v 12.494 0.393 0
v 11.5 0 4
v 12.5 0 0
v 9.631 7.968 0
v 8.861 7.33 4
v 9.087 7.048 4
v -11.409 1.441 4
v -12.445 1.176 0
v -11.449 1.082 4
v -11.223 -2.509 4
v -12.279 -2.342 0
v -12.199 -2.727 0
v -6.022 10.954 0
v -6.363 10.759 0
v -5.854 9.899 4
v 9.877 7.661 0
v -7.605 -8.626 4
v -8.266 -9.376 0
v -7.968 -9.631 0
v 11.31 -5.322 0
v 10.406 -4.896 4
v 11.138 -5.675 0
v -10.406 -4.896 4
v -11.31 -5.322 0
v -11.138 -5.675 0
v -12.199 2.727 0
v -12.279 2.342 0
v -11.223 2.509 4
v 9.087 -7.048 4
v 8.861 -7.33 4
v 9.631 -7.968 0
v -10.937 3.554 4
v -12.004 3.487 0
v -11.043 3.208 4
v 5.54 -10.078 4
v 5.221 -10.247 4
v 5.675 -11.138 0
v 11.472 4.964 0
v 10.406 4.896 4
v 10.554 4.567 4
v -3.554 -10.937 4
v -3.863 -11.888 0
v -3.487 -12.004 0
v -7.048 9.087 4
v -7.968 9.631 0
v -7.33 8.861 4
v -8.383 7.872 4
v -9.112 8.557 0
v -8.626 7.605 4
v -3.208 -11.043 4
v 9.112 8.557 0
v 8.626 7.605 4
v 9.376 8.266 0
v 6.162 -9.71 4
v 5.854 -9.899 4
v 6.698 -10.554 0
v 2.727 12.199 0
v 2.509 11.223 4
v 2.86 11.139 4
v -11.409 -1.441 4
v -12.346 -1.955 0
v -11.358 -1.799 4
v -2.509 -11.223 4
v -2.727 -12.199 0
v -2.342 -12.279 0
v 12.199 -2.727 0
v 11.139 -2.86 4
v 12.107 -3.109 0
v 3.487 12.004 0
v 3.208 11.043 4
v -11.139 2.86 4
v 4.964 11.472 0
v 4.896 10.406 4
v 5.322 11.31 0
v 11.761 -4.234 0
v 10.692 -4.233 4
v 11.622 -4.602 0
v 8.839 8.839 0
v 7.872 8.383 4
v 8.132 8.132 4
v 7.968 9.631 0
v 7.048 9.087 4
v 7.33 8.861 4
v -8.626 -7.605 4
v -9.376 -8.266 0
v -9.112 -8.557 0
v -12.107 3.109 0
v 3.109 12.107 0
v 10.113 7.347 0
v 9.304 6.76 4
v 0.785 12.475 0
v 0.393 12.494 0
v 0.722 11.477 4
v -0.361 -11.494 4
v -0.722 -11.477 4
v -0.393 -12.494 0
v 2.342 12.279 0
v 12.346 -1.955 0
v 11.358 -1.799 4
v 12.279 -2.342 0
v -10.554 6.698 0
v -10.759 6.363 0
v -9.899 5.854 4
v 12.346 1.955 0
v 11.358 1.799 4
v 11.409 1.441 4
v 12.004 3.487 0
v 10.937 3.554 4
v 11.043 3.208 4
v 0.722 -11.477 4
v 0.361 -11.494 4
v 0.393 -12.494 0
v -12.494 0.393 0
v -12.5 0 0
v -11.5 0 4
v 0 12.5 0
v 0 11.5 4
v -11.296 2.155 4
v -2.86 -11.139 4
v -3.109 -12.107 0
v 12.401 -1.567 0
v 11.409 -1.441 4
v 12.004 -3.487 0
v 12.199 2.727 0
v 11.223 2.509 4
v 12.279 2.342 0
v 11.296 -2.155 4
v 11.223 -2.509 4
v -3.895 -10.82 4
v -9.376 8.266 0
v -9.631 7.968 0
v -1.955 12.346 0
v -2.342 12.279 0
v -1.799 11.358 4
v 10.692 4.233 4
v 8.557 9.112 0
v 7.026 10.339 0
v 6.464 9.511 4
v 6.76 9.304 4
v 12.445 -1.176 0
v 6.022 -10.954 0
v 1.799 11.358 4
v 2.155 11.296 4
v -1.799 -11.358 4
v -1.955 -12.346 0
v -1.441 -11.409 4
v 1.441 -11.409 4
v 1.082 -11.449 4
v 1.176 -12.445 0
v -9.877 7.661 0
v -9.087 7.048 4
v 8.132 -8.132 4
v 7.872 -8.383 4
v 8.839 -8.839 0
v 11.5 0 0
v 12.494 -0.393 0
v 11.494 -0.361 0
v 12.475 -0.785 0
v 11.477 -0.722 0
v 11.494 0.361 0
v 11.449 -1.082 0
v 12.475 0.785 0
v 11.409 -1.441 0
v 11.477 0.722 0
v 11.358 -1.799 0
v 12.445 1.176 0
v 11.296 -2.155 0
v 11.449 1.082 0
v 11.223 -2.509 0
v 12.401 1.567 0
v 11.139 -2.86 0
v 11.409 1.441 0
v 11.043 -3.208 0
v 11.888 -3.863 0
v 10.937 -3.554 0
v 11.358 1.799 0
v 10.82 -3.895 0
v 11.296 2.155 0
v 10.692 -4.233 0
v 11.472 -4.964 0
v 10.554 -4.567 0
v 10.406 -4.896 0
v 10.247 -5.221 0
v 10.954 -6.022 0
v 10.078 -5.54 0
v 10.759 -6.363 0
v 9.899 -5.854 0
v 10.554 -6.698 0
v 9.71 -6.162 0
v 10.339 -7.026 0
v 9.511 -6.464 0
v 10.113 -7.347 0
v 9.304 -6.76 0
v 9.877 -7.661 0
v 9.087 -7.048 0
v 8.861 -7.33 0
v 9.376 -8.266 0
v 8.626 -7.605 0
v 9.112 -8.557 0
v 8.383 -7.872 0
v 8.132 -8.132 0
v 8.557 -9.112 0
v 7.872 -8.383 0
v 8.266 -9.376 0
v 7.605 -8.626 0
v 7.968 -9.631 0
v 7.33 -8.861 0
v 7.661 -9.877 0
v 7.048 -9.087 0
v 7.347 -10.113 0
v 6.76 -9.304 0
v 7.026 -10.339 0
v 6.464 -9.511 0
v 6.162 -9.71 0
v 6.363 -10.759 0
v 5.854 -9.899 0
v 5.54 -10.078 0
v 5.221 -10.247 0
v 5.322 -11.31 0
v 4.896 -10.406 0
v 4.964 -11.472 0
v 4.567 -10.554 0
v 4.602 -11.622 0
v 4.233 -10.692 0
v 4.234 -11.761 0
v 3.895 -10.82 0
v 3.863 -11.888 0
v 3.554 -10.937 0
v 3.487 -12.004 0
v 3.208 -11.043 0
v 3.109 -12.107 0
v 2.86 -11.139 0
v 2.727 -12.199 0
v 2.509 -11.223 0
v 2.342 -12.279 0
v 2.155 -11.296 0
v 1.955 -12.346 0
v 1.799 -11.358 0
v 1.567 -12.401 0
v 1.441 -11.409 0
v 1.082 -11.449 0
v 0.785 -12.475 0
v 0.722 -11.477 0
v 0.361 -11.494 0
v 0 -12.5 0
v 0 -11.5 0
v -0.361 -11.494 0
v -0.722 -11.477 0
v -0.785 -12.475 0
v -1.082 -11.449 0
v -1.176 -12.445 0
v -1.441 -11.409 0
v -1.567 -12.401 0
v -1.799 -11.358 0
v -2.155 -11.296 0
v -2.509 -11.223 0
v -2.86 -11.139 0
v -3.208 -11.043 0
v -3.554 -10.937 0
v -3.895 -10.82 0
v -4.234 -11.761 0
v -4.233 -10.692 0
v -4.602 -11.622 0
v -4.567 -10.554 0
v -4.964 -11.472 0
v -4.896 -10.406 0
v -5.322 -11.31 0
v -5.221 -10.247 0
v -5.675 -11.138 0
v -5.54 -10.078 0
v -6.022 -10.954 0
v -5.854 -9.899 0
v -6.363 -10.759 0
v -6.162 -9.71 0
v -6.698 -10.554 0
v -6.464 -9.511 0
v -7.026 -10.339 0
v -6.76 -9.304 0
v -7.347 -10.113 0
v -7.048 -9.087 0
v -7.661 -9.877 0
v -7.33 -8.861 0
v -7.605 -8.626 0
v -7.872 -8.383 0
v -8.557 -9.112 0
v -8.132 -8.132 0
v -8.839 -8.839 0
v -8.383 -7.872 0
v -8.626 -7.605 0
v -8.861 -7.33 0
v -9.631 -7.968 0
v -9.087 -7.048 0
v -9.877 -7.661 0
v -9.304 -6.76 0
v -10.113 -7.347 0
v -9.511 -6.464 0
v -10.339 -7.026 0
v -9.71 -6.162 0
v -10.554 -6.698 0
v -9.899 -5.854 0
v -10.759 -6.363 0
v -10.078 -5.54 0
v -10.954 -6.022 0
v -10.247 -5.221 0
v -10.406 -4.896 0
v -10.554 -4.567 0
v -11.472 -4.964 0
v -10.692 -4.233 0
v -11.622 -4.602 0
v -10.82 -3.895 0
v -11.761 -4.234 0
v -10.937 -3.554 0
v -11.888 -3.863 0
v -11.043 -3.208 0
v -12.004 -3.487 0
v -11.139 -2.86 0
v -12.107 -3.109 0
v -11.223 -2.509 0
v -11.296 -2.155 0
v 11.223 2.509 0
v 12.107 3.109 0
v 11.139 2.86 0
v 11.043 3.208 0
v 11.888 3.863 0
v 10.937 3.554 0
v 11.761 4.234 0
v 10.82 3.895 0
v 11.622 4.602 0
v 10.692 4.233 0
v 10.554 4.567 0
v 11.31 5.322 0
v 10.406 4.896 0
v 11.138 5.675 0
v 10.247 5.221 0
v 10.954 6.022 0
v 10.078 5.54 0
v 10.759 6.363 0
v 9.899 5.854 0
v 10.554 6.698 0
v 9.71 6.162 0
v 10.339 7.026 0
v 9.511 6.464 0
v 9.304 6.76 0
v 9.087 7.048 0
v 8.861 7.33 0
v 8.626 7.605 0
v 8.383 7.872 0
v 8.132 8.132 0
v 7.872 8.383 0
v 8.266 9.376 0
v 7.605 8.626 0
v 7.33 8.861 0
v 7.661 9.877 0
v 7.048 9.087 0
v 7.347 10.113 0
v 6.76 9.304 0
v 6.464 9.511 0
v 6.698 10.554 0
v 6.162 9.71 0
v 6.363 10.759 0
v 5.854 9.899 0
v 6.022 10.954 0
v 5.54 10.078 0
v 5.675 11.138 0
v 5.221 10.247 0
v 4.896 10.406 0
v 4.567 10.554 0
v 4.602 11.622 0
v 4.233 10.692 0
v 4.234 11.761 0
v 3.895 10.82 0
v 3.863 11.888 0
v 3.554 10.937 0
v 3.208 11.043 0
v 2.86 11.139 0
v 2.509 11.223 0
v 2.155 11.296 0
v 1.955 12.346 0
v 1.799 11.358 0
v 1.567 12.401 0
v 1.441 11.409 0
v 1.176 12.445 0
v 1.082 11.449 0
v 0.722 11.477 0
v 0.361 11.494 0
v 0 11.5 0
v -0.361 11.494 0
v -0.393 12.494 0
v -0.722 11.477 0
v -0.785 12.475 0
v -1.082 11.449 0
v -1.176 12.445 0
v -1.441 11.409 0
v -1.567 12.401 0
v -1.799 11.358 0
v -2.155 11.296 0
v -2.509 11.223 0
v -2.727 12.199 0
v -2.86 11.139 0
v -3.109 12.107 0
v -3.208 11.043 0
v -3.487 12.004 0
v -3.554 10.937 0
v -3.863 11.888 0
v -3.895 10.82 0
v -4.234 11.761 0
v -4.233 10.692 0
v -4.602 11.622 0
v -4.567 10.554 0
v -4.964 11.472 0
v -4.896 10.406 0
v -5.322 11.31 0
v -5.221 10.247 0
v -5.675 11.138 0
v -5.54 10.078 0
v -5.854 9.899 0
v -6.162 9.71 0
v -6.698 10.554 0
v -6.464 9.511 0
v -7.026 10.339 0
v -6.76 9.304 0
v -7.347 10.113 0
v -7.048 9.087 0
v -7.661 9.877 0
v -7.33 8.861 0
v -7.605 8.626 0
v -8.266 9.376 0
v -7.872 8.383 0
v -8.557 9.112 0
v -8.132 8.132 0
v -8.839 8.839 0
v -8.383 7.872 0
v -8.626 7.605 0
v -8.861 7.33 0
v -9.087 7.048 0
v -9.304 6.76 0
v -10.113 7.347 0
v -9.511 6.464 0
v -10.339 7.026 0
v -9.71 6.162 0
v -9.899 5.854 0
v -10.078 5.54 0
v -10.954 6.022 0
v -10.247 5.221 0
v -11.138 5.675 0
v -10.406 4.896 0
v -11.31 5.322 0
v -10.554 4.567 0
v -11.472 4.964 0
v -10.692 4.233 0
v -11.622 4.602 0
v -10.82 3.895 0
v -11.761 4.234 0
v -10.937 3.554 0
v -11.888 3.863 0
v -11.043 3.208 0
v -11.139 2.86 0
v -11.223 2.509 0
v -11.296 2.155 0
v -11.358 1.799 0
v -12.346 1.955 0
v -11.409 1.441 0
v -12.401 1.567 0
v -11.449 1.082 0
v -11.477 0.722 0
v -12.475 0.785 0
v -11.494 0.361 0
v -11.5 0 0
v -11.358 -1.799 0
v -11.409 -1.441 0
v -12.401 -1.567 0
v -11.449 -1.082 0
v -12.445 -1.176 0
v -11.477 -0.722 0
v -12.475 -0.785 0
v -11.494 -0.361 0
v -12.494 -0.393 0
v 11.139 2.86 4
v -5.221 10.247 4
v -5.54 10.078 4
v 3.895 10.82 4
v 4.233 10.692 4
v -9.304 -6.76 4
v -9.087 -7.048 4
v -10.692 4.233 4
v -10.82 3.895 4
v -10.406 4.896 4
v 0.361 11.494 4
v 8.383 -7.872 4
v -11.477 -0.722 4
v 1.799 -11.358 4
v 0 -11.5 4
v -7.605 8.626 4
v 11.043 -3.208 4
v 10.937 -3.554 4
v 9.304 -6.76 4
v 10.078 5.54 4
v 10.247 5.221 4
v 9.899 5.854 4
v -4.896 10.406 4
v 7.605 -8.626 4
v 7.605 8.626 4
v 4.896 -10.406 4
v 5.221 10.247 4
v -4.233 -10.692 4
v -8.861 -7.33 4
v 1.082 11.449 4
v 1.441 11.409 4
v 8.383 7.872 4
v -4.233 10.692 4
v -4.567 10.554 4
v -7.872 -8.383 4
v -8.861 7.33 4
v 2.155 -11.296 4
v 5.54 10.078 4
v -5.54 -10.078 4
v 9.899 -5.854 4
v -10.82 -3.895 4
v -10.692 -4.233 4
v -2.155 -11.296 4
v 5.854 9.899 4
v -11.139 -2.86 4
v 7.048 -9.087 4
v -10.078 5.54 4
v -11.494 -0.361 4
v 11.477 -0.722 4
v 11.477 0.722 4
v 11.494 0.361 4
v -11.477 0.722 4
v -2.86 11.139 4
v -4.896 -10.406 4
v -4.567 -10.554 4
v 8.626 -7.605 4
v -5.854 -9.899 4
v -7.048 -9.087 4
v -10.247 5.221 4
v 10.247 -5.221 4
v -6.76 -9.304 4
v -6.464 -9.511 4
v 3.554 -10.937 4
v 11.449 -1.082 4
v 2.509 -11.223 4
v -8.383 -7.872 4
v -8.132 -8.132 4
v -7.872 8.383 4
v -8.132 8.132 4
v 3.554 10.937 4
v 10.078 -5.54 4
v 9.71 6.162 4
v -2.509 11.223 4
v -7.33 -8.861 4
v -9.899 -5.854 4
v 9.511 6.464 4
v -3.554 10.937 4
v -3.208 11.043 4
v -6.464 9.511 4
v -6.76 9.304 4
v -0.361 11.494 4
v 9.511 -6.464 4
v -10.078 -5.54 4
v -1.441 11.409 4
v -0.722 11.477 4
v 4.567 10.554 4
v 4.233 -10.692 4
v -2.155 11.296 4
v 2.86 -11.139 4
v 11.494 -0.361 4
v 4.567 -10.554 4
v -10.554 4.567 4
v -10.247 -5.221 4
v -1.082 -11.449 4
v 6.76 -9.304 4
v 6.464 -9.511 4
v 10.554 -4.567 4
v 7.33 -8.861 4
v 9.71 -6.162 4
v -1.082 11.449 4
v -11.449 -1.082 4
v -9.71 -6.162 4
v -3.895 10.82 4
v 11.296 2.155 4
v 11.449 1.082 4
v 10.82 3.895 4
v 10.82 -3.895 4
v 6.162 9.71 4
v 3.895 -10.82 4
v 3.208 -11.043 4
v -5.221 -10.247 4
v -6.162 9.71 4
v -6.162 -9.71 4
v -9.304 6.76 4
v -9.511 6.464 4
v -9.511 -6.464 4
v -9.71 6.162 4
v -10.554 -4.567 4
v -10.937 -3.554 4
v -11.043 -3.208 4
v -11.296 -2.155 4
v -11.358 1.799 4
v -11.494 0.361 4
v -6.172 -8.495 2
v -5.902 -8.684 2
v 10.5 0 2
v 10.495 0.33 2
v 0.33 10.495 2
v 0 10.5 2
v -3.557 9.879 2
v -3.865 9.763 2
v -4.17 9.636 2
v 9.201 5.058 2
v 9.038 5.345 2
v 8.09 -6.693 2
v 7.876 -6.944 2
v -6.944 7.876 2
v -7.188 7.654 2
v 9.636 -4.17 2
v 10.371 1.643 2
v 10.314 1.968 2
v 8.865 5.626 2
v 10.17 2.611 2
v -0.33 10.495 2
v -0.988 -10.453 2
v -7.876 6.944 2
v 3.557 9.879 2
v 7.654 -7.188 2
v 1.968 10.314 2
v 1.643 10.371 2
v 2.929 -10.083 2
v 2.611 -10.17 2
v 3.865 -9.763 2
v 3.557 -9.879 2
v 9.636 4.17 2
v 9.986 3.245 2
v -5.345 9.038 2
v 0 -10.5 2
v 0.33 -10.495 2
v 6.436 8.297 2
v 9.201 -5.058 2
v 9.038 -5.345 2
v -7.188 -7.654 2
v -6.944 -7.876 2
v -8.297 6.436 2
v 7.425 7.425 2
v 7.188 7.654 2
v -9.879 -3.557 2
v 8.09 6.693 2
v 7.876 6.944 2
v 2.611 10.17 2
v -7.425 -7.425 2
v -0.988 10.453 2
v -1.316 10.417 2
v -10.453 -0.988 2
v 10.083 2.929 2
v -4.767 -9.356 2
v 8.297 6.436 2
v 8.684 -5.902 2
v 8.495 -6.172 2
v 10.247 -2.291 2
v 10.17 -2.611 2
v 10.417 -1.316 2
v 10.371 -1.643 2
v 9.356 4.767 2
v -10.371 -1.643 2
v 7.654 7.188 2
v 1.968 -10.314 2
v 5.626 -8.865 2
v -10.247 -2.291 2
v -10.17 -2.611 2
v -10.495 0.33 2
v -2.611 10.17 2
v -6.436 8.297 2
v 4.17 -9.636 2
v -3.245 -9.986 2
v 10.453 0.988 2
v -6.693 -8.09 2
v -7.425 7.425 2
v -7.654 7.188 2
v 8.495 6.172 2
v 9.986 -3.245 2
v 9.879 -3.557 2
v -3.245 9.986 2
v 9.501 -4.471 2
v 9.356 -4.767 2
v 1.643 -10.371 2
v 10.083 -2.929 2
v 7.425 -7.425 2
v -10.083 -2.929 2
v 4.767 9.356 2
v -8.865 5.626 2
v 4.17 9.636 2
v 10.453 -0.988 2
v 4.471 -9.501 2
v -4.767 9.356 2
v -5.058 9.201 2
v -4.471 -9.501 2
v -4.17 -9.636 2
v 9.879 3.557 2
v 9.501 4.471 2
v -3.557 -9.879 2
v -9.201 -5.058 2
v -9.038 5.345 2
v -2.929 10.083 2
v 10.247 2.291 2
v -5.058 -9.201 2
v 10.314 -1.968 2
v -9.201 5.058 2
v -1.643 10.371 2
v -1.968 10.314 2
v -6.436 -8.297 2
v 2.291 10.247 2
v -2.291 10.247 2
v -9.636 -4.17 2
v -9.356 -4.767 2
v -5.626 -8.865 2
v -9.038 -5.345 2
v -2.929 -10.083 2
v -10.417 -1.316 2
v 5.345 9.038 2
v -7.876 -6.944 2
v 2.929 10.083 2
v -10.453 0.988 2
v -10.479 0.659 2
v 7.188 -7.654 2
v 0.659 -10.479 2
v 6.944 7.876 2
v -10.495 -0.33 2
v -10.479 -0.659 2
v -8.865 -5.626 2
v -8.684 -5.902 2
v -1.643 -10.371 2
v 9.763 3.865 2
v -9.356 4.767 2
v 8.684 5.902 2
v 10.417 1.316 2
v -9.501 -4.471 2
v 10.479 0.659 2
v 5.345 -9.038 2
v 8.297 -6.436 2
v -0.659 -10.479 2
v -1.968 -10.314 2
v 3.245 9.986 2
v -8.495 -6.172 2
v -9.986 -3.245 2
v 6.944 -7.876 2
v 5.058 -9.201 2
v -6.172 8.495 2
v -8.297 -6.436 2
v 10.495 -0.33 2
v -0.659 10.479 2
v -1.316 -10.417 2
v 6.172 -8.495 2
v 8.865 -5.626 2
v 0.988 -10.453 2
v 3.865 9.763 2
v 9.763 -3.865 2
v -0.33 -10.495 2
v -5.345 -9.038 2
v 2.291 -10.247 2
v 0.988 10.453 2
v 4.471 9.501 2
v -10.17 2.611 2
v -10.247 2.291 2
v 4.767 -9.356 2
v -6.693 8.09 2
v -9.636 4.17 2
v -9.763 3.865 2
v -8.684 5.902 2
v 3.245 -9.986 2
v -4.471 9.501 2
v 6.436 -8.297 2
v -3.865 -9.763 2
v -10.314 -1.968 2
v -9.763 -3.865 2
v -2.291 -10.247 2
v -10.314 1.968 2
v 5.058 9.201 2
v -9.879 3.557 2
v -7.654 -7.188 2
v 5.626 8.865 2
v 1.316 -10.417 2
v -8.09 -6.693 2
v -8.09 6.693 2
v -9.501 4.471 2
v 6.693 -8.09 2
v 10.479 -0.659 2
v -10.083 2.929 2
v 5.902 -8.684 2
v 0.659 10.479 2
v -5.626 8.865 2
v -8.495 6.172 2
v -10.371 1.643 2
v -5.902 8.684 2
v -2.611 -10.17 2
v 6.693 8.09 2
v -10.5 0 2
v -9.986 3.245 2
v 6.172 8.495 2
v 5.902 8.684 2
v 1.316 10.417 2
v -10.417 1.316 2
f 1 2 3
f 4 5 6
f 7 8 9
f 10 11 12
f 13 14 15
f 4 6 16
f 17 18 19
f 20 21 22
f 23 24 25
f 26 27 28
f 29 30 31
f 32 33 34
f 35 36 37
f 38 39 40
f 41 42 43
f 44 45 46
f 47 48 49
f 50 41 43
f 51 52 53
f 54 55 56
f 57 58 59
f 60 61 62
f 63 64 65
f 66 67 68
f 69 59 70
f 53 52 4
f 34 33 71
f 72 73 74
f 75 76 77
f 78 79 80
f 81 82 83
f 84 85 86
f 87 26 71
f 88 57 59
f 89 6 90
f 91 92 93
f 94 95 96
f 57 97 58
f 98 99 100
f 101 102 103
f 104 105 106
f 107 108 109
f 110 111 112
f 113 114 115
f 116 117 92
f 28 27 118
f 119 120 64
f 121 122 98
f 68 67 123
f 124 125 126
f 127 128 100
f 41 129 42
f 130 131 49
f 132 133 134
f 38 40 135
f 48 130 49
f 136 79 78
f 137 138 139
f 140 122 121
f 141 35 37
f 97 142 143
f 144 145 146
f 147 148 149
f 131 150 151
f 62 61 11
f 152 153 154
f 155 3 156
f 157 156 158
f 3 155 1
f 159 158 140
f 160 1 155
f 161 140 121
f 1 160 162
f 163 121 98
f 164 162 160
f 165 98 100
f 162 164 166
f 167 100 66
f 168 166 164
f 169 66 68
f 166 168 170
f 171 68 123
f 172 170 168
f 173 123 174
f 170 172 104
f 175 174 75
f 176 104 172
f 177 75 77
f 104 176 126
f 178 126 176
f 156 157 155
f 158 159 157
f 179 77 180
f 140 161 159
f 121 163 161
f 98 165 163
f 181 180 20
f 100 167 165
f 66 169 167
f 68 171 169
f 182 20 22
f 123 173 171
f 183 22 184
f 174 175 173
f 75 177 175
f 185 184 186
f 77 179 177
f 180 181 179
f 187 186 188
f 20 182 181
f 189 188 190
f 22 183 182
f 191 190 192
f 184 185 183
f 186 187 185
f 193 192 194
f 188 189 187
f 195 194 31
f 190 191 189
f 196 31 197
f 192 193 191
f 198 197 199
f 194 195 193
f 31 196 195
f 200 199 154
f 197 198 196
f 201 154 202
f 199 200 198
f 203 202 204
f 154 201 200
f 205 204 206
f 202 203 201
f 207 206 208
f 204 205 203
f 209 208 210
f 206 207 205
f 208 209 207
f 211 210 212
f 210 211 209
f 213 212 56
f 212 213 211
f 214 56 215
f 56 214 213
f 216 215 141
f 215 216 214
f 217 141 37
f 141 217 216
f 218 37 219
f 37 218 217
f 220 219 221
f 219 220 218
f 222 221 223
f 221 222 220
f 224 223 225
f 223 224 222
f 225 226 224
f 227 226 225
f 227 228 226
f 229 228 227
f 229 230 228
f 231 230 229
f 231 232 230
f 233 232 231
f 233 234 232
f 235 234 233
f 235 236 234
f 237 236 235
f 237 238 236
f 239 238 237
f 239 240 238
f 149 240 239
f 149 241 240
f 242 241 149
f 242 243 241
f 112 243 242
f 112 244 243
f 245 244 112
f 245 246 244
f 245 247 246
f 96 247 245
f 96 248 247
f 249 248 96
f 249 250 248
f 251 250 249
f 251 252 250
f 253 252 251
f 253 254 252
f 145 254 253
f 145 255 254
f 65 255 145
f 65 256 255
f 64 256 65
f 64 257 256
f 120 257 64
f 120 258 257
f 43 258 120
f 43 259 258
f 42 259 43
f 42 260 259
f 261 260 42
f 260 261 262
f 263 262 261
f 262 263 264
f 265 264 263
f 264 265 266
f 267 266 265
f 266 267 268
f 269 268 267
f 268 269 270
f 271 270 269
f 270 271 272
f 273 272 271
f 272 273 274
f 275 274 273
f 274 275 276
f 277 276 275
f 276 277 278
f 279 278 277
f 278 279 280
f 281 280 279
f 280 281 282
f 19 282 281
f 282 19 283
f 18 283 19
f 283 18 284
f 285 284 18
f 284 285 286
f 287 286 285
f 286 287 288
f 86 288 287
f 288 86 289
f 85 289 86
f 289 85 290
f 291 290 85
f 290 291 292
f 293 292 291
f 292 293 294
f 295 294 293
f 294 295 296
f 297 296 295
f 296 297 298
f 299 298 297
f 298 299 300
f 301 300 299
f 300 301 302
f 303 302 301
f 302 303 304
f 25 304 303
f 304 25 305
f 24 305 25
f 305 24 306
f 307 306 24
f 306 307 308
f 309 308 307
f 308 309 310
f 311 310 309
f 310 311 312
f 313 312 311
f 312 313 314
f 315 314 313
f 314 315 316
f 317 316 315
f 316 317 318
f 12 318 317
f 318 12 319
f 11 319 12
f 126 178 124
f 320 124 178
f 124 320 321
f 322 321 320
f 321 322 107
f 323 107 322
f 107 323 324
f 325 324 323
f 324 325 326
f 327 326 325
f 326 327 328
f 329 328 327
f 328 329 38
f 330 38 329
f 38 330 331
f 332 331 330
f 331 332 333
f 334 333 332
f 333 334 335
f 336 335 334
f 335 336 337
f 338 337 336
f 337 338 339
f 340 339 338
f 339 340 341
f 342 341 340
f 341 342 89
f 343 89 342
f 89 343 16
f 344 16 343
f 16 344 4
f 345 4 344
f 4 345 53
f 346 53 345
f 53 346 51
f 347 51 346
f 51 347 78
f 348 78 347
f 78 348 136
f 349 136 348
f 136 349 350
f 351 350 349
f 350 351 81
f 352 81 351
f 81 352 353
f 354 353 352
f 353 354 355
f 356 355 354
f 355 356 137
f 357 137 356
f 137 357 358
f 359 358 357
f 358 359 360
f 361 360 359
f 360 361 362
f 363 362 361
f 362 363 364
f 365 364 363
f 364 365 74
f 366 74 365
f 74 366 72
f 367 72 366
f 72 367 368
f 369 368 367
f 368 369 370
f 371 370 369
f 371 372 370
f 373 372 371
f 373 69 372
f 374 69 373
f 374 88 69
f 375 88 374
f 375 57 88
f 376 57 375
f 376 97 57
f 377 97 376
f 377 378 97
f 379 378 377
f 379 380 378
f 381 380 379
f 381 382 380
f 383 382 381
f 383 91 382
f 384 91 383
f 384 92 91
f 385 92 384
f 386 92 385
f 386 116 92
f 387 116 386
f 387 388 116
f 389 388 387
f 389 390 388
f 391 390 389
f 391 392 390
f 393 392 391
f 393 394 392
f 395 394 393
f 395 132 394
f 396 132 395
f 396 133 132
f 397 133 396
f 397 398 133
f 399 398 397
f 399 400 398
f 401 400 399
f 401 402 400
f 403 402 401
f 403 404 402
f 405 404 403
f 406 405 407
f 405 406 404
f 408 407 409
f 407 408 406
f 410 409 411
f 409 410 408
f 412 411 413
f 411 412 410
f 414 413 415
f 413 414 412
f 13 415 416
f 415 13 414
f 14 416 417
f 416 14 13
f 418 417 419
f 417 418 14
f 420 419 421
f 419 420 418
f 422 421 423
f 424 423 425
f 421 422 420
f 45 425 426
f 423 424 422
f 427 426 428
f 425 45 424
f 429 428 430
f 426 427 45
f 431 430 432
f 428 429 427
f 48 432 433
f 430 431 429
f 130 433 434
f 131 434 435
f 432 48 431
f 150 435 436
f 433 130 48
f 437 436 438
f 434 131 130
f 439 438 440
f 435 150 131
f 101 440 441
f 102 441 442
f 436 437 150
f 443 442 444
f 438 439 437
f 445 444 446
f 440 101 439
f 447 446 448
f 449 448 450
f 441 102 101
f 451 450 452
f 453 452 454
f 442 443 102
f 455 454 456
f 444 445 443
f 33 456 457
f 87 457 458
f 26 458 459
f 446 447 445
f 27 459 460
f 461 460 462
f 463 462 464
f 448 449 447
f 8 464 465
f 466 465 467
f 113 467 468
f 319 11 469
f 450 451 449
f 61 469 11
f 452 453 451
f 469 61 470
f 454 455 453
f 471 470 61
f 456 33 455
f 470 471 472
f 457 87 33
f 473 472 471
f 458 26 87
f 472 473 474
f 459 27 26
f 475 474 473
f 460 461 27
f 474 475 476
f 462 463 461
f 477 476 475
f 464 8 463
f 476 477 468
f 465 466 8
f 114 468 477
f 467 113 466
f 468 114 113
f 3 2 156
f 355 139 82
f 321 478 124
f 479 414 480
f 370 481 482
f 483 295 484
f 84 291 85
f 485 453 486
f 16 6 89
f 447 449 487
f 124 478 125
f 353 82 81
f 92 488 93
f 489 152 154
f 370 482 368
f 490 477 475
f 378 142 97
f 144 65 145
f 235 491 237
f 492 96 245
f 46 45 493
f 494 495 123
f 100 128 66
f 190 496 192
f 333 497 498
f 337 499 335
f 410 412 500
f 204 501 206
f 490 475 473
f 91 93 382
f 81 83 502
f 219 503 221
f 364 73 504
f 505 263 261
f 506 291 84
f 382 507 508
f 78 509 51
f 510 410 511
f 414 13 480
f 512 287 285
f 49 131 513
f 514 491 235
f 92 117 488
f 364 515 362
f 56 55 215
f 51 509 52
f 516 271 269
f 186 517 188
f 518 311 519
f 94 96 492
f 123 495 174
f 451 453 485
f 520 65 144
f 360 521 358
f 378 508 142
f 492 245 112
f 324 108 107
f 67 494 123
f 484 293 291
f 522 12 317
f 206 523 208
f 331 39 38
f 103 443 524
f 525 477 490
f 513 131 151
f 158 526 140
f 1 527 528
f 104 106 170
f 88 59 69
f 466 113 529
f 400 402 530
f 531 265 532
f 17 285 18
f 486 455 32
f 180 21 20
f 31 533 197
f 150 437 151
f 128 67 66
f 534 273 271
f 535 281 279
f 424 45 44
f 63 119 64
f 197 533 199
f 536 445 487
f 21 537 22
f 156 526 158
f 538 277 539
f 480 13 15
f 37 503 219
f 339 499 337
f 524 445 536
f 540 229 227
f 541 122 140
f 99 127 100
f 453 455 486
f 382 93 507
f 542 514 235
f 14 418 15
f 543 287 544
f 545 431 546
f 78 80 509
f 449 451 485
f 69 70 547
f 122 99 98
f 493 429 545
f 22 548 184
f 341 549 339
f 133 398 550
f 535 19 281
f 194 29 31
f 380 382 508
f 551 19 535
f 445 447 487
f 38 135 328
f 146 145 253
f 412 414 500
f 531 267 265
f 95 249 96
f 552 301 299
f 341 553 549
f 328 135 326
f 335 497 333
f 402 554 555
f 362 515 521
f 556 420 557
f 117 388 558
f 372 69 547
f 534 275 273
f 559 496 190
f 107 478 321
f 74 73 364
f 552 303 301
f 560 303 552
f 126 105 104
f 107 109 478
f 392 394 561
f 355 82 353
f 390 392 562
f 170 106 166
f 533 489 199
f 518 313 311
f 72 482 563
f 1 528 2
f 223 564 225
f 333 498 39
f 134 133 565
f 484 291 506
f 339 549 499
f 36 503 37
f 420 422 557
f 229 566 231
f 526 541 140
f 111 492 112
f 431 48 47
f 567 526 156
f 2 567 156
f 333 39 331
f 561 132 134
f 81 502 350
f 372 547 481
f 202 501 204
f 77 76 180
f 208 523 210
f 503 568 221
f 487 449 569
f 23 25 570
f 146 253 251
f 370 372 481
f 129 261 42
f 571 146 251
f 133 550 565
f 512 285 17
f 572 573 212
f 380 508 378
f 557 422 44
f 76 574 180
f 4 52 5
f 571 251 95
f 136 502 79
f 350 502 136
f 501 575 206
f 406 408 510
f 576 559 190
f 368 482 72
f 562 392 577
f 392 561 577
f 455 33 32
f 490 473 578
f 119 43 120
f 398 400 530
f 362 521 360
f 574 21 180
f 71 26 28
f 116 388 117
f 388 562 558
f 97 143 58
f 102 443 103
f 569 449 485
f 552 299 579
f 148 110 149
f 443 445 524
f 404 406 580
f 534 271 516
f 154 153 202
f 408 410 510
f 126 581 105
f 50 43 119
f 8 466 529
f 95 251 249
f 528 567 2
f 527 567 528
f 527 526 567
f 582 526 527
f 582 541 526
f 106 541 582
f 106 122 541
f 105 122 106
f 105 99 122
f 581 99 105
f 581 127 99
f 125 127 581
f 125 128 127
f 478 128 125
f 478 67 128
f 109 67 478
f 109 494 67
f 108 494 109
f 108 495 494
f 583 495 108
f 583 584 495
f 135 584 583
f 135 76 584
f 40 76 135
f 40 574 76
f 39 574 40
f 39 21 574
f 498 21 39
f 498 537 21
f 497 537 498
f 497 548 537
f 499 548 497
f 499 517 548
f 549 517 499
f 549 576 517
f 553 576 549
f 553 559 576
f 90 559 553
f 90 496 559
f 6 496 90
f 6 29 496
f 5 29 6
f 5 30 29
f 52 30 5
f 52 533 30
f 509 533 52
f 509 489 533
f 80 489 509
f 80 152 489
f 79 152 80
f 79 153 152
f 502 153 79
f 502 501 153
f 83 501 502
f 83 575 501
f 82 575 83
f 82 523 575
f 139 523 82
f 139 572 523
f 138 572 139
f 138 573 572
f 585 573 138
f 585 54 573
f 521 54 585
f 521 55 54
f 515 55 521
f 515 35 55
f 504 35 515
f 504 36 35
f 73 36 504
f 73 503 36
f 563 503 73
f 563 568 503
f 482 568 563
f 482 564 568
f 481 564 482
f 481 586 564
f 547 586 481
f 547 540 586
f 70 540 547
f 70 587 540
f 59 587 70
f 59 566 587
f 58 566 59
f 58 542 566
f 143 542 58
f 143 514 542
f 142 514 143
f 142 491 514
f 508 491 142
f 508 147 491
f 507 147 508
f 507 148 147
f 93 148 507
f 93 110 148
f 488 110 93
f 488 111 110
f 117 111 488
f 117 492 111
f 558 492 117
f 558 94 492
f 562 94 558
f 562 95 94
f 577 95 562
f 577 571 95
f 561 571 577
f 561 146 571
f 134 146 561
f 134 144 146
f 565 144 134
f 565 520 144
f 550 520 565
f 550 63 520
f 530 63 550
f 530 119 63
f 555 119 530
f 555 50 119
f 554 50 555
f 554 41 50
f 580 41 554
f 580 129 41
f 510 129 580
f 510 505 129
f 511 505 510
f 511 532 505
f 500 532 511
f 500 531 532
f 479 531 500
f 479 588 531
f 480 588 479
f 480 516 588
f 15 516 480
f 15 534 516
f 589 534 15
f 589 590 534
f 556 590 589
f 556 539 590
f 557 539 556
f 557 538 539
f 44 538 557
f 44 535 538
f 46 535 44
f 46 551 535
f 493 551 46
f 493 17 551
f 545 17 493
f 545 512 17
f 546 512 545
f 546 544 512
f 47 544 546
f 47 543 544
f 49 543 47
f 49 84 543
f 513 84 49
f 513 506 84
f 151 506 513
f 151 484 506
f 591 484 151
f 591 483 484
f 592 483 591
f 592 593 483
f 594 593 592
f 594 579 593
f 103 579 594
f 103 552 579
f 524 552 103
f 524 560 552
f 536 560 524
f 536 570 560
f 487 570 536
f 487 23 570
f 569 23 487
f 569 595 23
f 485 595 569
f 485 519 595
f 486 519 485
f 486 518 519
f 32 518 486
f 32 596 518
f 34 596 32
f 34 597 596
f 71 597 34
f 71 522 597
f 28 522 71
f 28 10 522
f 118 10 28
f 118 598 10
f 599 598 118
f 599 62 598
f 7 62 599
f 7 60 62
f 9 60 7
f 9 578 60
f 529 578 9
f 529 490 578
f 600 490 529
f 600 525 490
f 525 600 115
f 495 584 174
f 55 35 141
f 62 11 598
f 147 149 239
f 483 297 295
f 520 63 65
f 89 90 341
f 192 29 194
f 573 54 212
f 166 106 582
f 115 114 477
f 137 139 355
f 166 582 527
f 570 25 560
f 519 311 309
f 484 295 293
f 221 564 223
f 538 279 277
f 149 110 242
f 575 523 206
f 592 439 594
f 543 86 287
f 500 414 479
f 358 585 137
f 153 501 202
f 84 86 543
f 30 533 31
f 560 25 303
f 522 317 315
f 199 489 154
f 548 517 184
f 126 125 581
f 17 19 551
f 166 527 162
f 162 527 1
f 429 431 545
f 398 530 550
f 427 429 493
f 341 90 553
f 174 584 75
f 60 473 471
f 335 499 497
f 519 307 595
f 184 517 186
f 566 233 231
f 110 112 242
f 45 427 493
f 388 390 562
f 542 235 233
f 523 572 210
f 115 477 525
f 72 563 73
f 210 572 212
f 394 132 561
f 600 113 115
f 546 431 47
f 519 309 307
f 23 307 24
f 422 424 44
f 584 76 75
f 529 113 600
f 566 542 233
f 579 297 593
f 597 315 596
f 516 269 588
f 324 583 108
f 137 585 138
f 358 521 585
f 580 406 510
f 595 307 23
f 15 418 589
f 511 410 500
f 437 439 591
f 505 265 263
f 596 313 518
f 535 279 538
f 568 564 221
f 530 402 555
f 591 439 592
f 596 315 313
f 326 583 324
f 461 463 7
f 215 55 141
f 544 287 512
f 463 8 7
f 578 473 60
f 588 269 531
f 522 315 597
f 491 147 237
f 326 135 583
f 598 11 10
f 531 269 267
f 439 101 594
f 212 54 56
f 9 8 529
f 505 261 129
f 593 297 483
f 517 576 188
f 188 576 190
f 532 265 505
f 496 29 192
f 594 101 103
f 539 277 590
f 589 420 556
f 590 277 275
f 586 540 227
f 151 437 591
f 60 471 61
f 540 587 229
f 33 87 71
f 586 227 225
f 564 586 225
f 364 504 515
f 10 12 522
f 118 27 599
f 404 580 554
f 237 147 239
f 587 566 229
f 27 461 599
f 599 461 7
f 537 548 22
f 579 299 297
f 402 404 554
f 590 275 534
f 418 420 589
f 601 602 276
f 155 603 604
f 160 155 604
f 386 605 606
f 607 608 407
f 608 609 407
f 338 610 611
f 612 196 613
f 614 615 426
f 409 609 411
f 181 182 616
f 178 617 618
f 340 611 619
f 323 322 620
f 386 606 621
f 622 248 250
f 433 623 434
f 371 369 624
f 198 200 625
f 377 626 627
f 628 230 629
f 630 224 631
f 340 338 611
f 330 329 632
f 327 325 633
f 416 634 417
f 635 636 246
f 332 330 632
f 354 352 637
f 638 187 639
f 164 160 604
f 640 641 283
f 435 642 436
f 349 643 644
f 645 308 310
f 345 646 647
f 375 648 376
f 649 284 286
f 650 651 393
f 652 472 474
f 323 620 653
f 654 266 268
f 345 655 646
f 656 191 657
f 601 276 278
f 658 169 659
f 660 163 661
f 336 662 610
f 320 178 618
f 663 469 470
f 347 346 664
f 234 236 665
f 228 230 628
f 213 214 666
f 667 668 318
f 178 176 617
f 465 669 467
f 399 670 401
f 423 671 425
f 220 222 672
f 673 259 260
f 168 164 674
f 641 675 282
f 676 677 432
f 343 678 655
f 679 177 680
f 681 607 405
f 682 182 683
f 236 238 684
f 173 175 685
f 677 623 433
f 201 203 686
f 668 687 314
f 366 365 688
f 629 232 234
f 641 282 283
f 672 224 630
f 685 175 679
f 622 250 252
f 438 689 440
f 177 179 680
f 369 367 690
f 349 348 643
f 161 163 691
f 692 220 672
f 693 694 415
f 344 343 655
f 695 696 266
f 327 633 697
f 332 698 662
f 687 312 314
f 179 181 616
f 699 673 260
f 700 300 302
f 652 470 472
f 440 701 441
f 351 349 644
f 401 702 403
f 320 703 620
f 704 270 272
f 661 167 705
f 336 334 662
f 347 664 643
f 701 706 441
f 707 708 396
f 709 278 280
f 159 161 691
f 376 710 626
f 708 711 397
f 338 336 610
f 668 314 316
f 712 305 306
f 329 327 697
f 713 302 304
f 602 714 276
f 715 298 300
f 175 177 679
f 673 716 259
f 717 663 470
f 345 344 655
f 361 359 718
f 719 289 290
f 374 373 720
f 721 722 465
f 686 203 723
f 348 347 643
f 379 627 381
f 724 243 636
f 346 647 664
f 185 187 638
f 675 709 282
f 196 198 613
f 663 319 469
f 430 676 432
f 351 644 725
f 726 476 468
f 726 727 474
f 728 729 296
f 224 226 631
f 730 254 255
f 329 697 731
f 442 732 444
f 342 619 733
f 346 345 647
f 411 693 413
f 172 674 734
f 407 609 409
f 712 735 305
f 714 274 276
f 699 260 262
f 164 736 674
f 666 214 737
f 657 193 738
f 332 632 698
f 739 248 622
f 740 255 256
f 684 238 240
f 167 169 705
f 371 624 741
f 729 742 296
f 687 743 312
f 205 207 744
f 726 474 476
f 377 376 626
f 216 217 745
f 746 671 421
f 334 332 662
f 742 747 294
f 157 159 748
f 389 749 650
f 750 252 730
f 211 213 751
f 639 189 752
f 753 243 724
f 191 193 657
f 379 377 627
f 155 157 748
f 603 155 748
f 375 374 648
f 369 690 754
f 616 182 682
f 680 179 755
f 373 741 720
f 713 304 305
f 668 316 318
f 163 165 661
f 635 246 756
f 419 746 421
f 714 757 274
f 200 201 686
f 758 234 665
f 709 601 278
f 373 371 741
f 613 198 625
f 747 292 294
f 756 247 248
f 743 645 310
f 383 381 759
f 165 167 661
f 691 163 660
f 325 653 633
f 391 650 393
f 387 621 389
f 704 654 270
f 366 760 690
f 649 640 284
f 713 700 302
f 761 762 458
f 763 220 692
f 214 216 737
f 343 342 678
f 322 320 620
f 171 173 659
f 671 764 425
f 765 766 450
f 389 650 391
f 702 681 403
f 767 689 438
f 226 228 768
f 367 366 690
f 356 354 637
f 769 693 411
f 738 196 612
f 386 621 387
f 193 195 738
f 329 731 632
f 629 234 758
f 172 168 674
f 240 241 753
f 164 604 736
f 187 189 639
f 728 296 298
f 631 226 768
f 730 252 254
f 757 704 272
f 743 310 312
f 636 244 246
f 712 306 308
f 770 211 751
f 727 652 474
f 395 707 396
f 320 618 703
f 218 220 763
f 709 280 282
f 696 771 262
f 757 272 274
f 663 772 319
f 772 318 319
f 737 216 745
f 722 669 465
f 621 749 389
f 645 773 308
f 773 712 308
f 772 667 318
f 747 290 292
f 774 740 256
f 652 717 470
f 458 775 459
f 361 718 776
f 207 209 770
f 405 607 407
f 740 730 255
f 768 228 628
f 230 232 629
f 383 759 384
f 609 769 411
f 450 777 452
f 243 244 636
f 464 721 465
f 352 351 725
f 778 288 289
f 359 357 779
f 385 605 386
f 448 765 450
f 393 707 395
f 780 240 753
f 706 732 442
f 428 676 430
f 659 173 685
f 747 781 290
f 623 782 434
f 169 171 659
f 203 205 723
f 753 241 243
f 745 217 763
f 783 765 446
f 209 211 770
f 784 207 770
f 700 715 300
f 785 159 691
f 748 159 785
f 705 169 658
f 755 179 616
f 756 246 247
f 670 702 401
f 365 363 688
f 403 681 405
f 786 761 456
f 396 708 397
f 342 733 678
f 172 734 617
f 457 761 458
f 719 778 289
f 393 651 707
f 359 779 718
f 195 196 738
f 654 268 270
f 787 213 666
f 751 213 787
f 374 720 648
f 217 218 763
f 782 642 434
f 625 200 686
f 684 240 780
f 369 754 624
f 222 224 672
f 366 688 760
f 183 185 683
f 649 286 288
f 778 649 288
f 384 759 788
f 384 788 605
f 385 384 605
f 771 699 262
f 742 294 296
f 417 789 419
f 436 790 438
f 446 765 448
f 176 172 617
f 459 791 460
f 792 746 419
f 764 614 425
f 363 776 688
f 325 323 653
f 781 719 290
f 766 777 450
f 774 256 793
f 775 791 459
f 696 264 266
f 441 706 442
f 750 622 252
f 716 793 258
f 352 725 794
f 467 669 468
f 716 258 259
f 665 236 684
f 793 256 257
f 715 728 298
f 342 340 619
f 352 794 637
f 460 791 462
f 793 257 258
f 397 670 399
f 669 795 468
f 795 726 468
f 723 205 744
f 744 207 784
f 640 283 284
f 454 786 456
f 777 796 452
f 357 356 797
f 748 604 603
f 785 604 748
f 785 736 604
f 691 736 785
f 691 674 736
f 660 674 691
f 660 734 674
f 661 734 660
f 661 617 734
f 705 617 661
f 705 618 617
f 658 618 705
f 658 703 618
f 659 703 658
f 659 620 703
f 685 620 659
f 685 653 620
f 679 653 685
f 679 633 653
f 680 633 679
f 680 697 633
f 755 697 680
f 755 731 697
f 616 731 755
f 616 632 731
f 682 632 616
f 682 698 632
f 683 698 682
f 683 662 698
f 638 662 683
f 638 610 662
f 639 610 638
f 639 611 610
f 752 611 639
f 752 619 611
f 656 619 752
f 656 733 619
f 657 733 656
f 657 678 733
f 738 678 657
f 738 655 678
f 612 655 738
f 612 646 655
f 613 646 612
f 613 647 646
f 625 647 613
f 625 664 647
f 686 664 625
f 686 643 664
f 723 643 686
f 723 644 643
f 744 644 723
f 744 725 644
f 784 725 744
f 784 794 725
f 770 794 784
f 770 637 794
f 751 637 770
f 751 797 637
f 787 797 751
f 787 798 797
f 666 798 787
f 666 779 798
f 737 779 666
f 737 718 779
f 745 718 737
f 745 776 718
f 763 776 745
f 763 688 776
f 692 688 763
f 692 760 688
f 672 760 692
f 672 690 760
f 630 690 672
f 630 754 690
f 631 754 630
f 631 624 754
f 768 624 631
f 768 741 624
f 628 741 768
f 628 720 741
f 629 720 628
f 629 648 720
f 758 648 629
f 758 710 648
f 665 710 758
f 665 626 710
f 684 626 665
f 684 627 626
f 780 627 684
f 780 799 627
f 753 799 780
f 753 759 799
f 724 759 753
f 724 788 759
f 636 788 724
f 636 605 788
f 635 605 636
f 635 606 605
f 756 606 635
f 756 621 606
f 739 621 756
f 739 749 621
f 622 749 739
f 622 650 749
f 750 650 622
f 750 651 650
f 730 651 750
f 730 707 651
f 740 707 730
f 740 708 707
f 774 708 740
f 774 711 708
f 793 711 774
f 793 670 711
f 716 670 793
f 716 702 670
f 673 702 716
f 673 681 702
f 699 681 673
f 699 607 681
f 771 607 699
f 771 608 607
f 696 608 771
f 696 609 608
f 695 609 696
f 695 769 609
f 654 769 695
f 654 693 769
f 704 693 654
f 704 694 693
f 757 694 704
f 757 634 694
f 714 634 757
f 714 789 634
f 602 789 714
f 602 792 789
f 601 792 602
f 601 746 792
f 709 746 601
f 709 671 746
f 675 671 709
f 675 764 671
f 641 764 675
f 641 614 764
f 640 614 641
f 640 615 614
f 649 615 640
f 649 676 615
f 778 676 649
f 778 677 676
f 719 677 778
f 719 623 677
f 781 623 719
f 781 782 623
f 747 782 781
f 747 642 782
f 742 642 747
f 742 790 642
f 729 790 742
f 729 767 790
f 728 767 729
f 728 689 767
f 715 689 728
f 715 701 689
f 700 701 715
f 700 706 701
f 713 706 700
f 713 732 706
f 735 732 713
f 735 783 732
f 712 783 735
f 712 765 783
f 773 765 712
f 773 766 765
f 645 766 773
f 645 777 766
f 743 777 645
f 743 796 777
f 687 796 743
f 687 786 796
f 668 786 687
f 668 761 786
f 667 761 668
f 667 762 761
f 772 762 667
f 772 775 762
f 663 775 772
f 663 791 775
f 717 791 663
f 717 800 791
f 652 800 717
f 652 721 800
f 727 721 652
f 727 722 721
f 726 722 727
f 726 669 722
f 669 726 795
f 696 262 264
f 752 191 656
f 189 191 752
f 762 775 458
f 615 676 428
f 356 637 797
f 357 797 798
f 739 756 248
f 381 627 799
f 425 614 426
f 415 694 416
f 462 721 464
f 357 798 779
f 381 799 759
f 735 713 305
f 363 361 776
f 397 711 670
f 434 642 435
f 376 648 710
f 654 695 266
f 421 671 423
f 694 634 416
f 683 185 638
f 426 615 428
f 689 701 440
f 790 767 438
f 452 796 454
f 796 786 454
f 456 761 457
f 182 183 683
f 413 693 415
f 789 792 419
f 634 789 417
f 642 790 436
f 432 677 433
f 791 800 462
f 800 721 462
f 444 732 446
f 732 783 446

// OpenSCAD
/* [General:] */
// The type of base to generate
BASE_TYPE = "r"; // [r:Round, s:Square, p:Pill]

// MM size of the base in the x direction
WIDTH = 25;

// MM size of the base in the y direction
DEPTH = 25;

// MM size of the base in the z direction
HEIGHT = 4;

// MM difference in size between the top and bottom of the base. Used to create chamfer
TOP_DIFF = 2;

// Thickness of the base walls
WALL_THICKNESS = 1;

module __Customizer_Limit__ () {}

$fn = 200;

if (BASE_TYPE == "r") {
    round_base(WIDTH, DEPTH, HEIGHT, TOP_DIFF, WALL_THICKNESS);
} else if (BASE_TYPE == "s") {
    square_base(WIDTH, DEPTH, HEIGHT, TOP_DIFF, WALL_THICKNESS);
} else {
    pill_base(WIDTH, DEPTH, HEIGHT, TOP_DIFF, WALL_THICKNESS);
}

module round_base(x, y, z, top_diff, wall_thickness) {
    _assert_dimensions(x, y, z, top_diff, wall_thickness);

    cutout_x = x - (wall_thickness * 2);
    cutout_y = y - (wall_thickness * 2);
    cutout_z = z / 2;

    x_scale_factor = x == y || x < y ? 1 : x / y;
    y_scale_factor = x == y || x > y ? 1 : y / x;

    diff_x_scale_factor = cutout_x == cutout_y || cutout_x < cutout_y ? 1 : cutout_x / cutout_y;
    diff_y_scale_factor = cutout_x == cutout_y || cutout_x > cutout_y ? 1 : cutout_y / cutout_x;

    base_rad = x > y ? y / 2 : x / 2;
    cutout_rad = cutout_x > cutout_y ? cutout_y / 2 : cutout_x / 2;

    difference() {
        scale([x_scale_factor, y_scale_factor, 1]) {
            cylinder(r1 = base_rad, r2 = base_rad - (top_diff / 2), h = z);
        }

        scale([diff_x_scale_factor, diff_y_scale_factor, 1]) {
            cylinder(r1 = cutout_rad, r2 = cutout_rad - (top_diff / 2), h = cutout_z);
        }
    }
}

module square_base(x, y, z, top_diff, wall_thickness) {
    _assert_dimensions(x, y, z, top_diff, wall_thickness);

    difference() {
        _chamfered_square(x, y, z, top_diff);

        _chamfered_square(
            x - (2 * wall_thickness),
            y - (2 * wall_thickness),
            z / 2,
            top_diff
        );
    }
}

module pill_base(x, y, z, top_diff, wall_thickness) {
    _assert_dimensions(x, y, z, top_diff, wall_thickness);

    base_rad = x > y ? y / 2 : x / 2;

    x_trans = x < y ? 0 : (x - (2 * base_rad)) / 2;
    y_trans = y < x ? 0 : (y - (2 * base_rad)) / 2;

    echo(x, y, z);
    echo(base_rad, x_trans, y_trans);

    difference() {
        hull() {
            translate([x_trans, y_trans, 0]) {
                cylinder(h = z, r1 = base_rad, r2 = base_rad - (top_diff / 2),center = false);
            }

            translate([-x_trans, -y_trans, 0]) {
                cylinder(h = z, r1 = base_rad, r2 = base_rad - (top_diff / 2),center = false);
            }
        }

        hull() {
            translate([x_trans, y_trans, 0]) {
                cylinder(
                    h = z / 2,
                    r1 = base_rad - (wall_thickness),
                    r2 = base_rad - (top_diff / 2) - (wall_thickness),
                    center = false
                );
            }

            translate([-x_trans, -y_trans, 0]) {
                cylinder(
                    h = z / 2,
                    r1 = base_rad - (wall_thickness),
                    r2 = base_rad - (top_diff / 2) - (wall_thickness),
                    center = false
                );
            }
        }
    }
}


module _chamfered_square(x, y, z, top_diff, hull_allowance = 0.00001) {
    top_x = x - top_diff;
    top_y = y - top_diff;

    hull() {
        translate([-x/2 , -y/2, 0]) {
            cube([x, y, hull_allowance]);
        }

        translate([-top_x/2 , -top_y/2, z - hull_allowance]) {
            cube([top_x, top_y, hull_allowance]);
        }
    }
}

module _assert_dimensions(x, y, z, top_diff, wall_thickness) {
    assert(is_num(x) && x > 0, "Expected a positive number MM measurement for the width.");
    assert(is_num(y) && y > 0, "Expected a positive number MM measurement for the depth.");
    assert(is_num(z) && z > 0, "Expected a positive number MM measurement for the height.");
    assert(is_num(top_diff) && top_diff >= 0, "The chamfer difference must be a positive number.");
    assert(
        is_num(wall_thickness) && wall_thickness > 0,
        "The wall thickness must be a positive number"
    );
}
